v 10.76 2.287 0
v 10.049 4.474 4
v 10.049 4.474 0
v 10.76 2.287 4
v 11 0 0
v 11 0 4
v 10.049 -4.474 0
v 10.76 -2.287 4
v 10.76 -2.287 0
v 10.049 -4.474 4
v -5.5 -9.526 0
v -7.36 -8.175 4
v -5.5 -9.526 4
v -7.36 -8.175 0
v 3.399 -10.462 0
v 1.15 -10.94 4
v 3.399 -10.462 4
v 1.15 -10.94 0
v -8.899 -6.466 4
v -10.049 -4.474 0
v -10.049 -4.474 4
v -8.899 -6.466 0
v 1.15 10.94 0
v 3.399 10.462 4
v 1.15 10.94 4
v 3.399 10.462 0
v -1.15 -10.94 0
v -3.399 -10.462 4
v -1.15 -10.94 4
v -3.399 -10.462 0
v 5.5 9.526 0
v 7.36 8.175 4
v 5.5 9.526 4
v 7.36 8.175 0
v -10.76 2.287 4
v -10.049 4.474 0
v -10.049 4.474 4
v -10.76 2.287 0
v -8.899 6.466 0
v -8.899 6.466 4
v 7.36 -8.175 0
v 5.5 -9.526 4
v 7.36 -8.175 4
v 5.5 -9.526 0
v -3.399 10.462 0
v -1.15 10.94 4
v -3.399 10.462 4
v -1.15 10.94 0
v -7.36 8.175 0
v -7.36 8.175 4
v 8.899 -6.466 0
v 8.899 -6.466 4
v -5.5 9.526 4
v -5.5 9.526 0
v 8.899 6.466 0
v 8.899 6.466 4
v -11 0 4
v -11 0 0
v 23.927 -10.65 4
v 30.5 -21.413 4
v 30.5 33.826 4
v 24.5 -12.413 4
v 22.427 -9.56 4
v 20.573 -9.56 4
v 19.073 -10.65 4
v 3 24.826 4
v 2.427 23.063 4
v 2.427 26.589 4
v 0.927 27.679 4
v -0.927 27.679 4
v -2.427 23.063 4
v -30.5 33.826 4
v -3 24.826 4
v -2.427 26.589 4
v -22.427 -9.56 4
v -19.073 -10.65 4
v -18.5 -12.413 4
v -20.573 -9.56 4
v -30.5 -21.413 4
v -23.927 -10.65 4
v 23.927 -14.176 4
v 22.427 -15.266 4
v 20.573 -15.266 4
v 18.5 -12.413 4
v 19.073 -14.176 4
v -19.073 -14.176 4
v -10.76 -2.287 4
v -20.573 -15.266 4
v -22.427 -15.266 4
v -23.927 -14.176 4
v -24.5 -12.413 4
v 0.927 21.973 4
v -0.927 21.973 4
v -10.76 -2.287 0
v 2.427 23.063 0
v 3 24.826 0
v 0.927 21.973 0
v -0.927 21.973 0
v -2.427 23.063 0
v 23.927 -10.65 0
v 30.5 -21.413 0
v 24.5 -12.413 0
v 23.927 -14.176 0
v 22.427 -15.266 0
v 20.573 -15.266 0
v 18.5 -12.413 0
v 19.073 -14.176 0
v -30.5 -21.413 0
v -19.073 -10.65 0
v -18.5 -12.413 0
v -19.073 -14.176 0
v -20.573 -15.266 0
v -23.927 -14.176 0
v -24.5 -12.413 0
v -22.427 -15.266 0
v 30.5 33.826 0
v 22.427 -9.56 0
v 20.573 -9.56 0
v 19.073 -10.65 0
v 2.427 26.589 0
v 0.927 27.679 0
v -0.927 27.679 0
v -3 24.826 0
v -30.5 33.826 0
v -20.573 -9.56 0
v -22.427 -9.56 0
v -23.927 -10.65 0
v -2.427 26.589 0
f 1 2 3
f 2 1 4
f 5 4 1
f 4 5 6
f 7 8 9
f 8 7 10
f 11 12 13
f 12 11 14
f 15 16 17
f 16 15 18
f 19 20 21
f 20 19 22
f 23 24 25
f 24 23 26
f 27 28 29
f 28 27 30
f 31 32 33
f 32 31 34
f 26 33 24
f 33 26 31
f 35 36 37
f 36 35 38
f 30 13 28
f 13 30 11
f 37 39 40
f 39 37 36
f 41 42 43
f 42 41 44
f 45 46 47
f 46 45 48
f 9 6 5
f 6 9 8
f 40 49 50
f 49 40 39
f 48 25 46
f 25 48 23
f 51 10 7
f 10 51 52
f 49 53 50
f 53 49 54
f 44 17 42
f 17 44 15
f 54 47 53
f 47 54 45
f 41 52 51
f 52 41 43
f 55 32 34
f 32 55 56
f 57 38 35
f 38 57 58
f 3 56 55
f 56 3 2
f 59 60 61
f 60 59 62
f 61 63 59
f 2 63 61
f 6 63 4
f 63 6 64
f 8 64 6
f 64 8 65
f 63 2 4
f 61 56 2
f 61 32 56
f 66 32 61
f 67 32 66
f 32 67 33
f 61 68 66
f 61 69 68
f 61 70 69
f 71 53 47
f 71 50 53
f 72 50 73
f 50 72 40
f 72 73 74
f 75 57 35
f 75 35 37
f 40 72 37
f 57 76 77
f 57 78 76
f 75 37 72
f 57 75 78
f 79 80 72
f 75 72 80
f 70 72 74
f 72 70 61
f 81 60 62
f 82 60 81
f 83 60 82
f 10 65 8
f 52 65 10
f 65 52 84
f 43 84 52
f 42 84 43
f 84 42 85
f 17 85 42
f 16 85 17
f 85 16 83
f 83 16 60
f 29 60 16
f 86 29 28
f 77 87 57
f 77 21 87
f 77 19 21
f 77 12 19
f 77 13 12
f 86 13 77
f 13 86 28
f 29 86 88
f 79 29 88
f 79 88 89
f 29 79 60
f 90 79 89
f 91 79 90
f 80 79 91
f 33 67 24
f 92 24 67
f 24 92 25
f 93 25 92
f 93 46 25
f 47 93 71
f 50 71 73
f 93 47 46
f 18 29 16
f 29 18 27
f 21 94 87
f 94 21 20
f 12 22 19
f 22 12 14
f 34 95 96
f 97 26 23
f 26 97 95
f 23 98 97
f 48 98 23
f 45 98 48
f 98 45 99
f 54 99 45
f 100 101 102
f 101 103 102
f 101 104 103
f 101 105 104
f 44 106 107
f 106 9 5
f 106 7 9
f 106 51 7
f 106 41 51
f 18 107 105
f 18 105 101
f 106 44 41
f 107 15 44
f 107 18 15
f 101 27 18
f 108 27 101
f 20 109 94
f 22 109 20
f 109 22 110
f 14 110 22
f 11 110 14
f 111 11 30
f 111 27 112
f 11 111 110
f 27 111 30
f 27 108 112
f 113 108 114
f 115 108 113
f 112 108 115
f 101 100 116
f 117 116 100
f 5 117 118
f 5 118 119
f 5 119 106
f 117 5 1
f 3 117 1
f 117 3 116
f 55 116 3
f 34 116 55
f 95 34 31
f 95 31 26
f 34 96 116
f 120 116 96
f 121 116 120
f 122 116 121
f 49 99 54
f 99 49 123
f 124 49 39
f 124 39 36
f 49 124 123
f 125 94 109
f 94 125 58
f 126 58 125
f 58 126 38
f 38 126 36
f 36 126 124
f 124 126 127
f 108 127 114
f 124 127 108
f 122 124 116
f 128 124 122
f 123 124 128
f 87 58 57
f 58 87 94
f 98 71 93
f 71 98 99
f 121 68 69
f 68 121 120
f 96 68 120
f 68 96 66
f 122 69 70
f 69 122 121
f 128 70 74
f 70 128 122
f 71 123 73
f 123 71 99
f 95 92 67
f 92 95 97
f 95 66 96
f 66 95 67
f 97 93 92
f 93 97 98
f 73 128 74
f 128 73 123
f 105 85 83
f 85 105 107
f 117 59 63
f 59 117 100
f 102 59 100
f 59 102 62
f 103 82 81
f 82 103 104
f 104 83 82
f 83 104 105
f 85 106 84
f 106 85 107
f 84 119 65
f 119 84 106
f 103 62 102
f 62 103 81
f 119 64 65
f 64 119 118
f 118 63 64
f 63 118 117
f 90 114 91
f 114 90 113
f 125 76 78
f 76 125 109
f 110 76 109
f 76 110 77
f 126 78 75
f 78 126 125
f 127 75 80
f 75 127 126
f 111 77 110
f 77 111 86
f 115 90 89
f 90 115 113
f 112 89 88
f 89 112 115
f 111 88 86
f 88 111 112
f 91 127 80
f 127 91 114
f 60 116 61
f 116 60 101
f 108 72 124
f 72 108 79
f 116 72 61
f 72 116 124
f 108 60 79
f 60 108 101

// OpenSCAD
/* wiper motor mount
   mount holes at verticies of equilateral triangle
   length of side a = 43mm
   height = a*sqrt(3)/2
   height of center (apthom) = h/3
*/

module motor_mount(d=6, da=22, s=43, t=4, pad=12){
  /* 
   d = mounting bolt hole diameter
   da = arbor hole diameter
   s = length of side of equilateral triangle
   t = height or thickness
  */
  h = s*sqrt(3)/2; // height of equilateral triangle   
  echo(h);
  
  // bounding box dimensions + padding
  box_h = h + d + pad;
  box_w = s + d + pad;
  box_x = -box_w/2;
  box_y = (-h/3)-(d+pad)/2;

  difference(){
    // plate
    translate([box_x, box_y, 0]){cube([box_w, box_h, t]);} 
    union(){
      // arbor
      translate([0,0,0]){cylinder(t, d=da);}
      // mounting holes
      translate([0, 2*h/3, 0]){cylinder(t, d=d);}
      translate([s/2, -h/3, 0]){cylinder(t, d=d);}
      translate([-s/2, -h/3, 0]){cylinder(t, d=d);}
    }
  }
}

motor_mount();
